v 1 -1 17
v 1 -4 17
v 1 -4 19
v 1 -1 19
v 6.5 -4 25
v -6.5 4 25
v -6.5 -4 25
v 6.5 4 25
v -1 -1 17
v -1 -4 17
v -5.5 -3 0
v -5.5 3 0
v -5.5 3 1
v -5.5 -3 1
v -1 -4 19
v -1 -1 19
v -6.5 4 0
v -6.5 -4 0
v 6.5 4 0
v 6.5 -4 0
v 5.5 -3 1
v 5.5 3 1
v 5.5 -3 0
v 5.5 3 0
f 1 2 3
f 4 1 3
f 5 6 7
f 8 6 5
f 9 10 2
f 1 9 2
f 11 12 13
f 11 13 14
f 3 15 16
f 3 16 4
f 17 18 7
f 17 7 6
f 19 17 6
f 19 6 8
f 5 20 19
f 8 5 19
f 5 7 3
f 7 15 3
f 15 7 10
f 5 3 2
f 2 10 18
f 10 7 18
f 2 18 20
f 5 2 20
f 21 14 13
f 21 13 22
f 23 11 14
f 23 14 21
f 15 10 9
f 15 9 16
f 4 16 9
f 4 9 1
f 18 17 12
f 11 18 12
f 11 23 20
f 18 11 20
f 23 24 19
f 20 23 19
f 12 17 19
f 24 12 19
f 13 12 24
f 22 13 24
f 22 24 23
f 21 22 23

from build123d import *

# Parameters (mm, degrees)
F0_W     = 13
F0_H     = 8
F1_DEPTH = 25
F2_W     = 11
F2_H     = 6
F3_DEPTH = 1
F4_W     = 2
F4_H     = 2
F5_DEPTH = 3


with BuildPart() as f1:
    # F0 (on Top) → F1 (new body)
    with BuildSketch(Plane.XY):
        Rectangle(F0_W, F0_H)
    extrude(amount=F1_DEPTH)

    # F2 (on face) → F3 (cut)
    with BuildSketch(Plane(origin=(0, 0, 0), x_dir=(1, 0, 0), z_dir=(0, 0, -1))):
        Rectangle(F2_W, F2_H)
    extrude(amount=-F3_DEPTH, mode=Mode.SUBTRACT)

    # F4 (on face) → F5 (cut)
    with BuildSketch(Plane.XZ.offset(4)):
        with Locations((0, 18)):
            Rectangle(F4_W, F4_H)
    extrude(amount=-F5_DEPTH, mode=Mode.SUBTRACT)


solid = f1.part
